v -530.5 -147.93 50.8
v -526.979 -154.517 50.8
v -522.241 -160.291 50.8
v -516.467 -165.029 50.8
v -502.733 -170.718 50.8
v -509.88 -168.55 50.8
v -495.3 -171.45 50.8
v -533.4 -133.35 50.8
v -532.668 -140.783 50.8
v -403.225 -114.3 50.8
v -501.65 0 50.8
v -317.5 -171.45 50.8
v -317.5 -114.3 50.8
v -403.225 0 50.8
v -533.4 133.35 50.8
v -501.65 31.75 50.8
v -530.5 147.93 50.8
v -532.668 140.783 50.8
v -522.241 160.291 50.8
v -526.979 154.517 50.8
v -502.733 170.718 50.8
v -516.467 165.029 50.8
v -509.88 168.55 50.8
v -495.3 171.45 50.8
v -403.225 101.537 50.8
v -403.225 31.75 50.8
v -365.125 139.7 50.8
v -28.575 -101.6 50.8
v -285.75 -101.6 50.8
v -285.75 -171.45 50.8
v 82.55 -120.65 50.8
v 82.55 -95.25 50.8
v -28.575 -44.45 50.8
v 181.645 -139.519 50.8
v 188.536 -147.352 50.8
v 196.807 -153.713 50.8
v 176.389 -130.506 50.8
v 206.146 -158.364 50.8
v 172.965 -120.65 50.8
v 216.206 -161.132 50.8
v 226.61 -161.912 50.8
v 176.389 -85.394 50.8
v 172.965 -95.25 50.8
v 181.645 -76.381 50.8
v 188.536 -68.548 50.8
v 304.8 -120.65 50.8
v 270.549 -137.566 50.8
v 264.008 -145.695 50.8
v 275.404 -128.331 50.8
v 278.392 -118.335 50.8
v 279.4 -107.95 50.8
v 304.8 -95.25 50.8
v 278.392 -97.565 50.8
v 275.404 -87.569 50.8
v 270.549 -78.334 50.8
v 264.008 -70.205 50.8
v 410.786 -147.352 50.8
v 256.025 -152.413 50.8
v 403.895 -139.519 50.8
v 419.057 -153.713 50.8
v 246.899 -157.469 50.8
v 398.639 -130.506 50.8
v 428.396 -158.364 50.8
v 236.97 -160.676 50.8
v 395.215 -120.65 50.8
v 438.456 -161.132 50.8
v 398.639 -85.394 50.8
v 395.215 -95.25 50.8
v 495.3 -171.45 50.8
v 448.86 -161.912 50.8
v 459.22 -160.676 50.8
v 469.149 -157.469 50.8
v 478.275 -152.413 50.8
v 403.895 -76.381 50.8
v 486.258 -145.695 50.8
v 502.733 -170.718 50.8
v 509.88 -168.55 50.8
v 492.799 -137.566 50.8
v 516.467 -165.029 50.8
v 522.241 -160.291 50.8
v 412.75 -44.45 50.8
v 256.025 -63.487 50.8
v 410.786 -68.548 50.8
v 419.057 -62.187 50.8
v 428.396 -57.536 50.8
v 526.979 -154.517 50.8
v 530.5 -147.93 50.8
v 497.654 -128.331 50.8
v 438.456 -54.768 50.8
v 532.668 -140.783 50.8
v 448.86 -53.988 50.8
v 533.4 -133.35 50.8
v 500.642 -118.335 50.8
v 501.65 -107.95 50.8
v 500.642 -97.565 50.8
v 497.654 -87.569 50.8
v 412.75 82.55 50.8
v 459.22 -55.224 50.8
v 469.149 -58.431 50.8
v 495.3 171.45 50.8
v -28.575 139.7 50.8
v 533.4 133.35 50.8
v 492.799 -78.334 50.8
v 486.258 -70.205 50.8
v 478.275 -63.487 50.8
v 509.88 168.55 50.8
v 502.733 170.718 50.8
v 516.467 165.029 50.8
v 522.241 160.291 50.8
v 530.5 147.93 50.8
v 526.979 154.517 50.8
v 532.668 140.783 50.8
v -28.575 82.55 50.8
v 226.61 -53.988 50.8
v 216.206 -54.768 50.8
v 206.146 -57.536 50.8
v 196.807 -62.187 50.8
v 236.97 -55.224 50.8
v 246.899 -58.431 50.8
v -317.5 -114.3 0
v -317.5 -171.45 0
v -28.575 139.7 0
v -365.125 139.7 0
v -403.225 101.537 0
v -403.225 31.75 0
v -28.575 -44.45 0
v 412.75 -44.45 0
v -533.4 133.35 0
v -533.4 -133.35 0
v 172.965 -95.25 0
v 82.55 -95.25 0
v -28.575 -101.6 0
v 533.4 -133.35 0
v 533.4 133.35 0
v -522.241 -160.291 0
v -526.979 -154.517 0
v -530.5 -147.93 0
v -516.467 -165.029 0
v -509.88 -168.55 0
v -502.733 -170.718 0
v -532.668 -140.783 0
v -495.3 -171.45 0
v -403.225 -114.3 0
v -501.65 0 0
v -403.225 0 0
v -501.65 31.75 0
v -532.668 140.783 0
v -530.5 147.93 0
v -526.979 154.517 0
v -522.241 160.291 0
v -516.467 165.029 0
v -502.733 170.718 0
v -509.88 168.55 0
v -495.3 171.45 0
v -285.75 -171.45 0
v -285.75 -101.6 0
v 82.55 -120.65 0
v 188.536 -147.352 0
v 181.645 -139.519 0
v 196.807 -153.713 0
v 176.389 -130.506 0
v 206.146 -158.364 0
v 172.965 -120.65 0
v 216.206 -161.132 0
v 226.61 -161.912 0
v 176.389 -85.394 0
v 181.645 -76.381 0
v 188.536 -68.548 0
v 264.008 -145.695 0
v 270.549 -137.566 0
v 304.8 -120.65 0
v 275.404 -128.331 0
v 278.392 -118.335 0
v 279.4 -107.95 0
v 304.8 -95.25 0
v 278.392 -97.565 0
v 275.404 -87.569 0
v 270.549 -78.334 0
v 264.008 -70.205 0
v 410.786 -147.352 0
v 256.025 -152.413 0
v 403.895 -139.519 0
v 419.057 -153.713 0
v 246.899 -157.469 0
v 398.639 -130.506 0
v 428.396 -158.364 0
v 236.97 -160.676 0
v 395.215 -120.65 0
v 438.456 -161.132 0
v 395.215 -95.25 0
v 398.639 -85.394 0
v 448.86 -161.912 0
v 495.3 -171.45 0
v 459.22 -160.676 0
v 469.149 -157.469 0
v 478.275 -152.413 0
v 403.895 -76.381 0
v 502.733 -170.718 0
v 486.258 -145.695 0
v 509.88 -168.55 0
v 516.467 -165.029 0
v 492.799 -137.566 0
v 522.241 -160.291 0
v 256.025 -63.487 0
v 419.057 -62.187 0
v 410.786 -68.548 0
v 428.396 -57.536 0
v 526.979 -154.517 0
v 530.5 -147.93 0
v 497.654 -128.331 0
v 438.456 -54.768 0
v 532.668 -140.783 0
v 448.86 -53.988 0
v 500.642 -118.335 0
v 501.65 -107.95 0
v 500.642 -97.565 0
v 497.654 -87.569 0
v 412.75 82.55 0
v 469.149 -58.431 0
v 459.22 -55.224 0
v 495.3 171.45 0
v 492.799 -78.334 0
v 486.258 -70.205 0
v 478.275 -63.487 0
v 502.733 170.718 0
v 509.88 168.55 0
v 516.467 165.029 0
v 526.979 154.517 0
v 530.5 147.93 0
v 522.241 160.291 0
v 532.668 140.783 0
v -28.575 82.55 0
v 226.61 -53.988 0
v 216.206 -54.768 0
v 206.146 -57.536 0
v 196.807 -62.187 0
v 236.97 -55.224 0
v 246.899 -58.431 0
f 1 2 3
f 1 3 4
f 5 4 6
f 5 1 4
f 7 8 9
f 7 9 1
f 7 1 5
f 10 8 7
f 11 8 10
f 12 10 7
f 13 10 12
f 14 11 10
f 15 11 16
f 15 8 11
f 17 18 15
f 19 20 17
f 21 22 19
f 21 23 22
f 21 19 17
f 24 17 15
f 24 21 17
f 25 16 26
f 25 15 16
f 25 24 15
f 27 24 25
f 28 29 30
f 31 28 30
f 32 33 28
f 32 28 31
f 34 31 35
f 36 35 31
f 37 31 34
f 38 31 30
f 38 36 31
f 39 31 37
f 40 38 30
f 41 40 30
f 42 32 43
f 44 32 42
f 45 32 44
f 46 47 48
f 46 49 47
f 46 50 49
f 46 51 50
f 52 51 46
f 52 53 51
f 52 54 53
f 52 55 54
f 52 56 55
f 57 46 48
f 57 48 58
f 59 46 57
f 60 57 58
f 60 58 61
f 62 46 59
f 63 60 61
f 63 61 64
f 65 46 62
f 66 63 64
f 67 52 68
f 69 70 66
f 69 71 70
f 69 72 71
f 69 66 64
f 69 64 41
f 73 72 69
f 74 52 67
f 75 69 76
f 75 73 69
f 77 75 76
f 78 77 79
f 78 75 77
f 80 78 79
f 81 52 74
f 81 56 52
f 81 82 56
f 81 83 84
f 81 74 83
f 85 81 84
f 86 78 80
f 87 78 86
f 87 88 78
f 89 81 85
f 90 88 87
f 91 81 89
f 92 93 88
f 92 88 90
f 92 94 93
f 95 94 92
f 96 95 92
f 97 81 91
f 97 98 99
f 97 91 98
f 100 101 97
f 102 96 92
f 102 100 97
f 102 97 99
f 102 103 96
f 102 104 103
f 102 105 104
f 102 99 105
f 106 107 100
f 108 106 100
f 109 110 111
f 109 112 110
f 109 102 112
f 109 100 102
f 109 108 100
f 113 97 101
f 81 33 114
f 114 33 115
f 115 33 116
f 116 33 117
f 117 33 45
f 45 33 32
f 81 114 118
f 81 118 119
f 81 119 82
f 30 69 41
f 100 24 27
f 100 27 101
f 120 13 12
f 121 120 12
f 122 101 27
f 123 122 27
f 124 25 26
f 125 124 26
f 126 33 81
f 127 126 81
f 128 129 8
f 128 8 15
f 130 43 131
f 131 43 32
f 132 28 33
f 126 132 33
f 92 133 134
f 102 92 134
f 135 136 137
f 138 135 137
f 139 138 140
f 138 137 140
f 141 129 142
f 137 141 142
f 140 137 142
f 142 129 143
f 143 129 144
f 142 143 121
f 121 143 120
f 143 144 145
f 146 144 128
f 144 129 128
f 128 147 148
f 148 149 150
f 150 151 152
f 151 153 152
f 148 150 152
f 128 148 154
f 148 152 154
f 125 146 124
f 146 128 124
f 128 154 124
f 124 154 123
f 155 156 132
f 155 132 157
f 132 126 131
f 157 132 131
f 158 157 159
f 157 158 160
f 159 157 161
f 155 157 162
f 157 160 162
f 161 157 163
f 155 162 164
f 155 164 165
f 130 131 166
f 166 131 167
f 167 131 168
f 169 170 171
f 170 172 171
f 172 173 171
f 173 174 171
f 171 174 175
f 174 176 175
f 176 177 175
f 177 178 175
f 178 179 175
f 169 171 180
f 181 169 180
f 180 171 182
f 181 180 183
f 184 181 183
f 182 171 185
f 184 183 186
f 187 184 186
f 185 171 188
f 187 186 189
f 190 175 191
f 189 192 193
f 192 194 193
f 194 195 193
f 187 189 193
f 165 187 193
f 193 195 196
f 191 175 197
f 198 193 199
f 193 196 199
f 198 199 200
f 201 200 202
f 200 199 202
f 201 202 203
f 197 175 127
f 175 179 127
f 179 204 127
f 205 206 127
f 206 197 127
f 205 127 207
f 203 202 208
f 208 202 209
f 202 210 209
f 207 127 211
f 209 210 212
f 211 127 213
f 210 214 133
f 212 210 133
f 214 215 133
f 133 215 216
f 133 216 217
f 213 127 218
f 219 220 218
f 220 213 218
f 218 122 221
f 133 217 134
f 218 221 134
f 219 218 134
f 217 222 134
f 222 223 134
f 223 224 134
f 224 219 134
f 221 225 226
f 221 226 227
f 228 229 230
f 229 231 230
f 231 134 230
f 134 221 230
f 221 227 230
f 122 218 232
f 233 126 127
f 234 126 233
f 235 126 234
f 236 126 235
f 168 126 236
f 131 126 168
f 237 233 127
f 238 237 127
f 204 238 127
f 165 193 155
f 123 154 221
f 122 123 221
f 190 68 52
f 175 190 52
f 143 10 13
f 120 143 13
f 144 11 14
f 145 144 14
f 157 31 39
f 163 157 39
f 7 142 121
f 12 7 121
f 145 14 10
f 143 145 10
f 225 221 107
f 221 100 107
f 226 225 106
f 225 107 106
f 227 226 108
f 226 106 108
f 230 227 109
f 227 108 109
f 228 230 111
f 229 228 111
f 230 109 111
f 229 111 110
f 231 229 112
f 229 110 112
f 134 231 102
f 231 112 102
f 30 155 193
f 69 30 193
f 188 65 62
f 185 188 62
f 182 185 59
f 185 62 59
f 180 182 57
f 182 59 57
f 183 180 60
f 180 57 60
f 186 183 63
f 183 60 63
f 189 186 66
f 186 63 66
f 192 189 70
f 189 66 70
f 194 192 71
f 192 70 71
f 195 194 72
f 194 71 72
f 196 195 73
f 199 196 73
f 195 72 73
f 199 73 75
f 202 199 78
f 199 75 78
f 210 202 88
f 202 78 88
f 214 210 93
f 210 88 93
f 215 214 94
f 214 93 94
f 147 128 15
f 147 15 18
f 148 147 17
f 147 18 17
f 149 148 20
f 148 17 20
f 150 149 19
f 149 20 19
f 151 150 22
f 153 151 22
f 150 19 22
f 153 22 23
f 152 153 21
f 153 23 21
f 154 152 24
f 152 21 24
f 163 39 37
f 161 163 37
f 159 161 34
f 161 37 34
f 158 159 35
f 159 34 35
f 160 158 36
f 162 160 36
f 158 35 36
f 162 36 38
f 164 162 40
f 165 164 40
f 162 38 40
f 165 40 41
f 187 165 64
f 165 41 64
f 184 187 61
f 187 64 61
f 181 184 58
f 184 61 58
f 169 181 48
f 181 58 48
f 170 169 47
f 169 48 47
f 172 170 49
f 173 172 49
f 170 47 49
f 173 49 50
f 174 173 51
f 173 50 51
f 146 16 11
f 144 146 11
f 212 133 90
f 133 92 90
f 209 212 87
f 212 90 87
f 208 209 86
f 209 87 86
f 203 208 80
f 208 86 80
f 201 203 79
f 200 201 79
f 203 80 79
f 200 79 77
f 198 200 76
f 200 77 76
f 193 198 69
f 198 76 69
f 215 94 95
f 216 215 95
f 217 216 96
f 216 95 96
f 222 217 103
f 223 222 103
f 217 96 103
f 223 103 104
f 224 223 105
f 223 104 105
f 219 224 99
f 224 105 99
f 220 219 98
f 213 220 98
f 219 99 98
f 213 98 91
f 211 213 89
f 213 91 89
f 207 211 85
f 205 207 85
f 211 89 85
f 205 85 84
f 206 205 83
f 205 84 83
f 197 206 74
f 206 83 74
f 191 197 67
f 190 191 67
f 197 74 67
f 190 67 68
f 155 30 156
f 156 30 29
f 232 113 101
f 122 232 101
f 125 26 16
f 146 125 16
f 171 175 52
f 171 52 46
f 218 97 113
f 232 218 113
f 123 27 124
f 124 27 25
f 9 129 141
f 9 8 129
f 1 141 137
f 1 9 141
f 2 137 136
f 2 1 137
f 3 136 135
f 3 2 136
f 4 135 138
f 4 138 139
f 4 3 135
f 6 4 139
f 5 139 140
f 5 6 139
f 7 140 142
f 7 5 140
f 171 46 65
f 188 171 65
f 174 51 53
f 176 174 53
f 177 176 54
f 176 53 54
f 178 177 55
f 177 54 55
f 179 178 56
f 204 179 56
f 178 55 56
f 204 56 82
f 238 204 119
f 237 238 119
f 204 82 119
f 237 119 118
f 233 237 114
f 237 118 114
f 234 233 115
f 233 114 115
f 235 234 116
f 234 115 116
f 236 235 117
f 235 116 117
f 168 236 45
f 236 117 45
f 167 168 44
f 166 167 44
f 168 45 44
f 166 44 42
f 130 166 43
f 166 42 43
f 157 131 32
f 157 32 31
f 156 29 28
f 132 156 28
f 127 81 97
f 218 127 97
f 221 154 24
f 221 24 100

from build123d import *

# Parameters (mm, degrees)
F0_W     = 1066.8
F0_H     = 342.9
F1_DEPTH = 50.8
F3_DEPTH = 50.8
F4_R     = 38.1
F6_DEPTH = 50.8
F8_DEPTH = 50.8


with BuildPart() as f1:
    # F0 (on Top) → F1 (new body)
    with BuildSketch(Plane.XY):
        Rectangle(F0_W, F0_H)
    extrude(amount=F1_DEPTH)

    # F2 (on face) → F3 (cut)
    with BuildSketch(Plane.XY.offset(50.8)):
        Polygon((-317.5, -114.3), (-317.5, -171.45), (-285.75, -171.45), (-285.75, -101.6), (-28.575, -101.6), (-28.575, -44.45), (412.75, -44.45), (412.75, 82.55), (-28.575, 82.55), (-28.575, 139.7), (-365.125, 139.7), (-403.225, 101.537321), (-403.225, 31.75), (-501.65, 31.75), (-501.65, 0), (-403.225, 0), (-403.225, -114.3), align=None)
    extrude(amount=-F3_DEPTH, mode=Mode.SUBTRACT)

    # F4
    f4_edges = [f1.edges().sort_by_distance(p)[0] for p in [
        (-533.4, 171.45, 25.4),
        (-533.4, -171.45, 25.4),
        (533.4, 171.45, 25.4),
        (533.4, -171.45, 25.4),
    ]]
    fillet(f4_edges, radius=F4_R)

    # F5 (on face) → F6 (cut)
    with BuildSketch(Plane.XY.offset(50.8)):
        with BuildLine():
            Line((172.965391, -95.25), (82.55, -95.25))
            Line((82.55, -95.25), (82.55, -120.65))
            Line((82.55, -120.65), (172.965391, -120.65))
            ThreePointArc((172.965391, -120.65), (171.45, -107.95), (172.965391, -95.25))
        make_face()
        with BuildLine():
            ThreePointArc((279.4, -107.95), (231.820045, -54.355187), (172.965391, -95.25))
            ThreePointArc((172.965391, -95.25), (171.45, -107.95), (172.965391, -120.65))
            ThreePointArc((172.965391, -120.65), (231.820045, -161.544813), (279.4, -107.95))
        make_face()
    extrude(amount=-F6_DEPTH, mode=Mode.SUBTRACT)

    # F7 (on face) → F8 (cut)
    with BuildSketch(Plane.XY.offset(50.8)):
        with BuildLine():
            Line((395.215391, -95.25), (304.8, -95.25))
            Line((304.8, -95.25), (304.8, -120.65))
            Line((304.8, -120.65), (395.215391, -120.65))
            ThreePointArc((395.215391, -120.65), (393.7, -107.95), (395.215391, -95.25))
        make_face()
        with BuildLine():
            ThreePointArc((501.65, -107.95), (454.070045, -54.355187), (395.215391, -95.25))
            ThreePointArc((395.215391, -95.25), (393.7, -107.95), (395.215391, -120.65))
            ThreePointArc((395.215391, -120.65), (454.070045, -161.544813), (501.65, -107.95))
        make_face()
    extrude(amount=-F8_DEPTH, mode=Mode.SUBTRACT)


solid = f1.part
